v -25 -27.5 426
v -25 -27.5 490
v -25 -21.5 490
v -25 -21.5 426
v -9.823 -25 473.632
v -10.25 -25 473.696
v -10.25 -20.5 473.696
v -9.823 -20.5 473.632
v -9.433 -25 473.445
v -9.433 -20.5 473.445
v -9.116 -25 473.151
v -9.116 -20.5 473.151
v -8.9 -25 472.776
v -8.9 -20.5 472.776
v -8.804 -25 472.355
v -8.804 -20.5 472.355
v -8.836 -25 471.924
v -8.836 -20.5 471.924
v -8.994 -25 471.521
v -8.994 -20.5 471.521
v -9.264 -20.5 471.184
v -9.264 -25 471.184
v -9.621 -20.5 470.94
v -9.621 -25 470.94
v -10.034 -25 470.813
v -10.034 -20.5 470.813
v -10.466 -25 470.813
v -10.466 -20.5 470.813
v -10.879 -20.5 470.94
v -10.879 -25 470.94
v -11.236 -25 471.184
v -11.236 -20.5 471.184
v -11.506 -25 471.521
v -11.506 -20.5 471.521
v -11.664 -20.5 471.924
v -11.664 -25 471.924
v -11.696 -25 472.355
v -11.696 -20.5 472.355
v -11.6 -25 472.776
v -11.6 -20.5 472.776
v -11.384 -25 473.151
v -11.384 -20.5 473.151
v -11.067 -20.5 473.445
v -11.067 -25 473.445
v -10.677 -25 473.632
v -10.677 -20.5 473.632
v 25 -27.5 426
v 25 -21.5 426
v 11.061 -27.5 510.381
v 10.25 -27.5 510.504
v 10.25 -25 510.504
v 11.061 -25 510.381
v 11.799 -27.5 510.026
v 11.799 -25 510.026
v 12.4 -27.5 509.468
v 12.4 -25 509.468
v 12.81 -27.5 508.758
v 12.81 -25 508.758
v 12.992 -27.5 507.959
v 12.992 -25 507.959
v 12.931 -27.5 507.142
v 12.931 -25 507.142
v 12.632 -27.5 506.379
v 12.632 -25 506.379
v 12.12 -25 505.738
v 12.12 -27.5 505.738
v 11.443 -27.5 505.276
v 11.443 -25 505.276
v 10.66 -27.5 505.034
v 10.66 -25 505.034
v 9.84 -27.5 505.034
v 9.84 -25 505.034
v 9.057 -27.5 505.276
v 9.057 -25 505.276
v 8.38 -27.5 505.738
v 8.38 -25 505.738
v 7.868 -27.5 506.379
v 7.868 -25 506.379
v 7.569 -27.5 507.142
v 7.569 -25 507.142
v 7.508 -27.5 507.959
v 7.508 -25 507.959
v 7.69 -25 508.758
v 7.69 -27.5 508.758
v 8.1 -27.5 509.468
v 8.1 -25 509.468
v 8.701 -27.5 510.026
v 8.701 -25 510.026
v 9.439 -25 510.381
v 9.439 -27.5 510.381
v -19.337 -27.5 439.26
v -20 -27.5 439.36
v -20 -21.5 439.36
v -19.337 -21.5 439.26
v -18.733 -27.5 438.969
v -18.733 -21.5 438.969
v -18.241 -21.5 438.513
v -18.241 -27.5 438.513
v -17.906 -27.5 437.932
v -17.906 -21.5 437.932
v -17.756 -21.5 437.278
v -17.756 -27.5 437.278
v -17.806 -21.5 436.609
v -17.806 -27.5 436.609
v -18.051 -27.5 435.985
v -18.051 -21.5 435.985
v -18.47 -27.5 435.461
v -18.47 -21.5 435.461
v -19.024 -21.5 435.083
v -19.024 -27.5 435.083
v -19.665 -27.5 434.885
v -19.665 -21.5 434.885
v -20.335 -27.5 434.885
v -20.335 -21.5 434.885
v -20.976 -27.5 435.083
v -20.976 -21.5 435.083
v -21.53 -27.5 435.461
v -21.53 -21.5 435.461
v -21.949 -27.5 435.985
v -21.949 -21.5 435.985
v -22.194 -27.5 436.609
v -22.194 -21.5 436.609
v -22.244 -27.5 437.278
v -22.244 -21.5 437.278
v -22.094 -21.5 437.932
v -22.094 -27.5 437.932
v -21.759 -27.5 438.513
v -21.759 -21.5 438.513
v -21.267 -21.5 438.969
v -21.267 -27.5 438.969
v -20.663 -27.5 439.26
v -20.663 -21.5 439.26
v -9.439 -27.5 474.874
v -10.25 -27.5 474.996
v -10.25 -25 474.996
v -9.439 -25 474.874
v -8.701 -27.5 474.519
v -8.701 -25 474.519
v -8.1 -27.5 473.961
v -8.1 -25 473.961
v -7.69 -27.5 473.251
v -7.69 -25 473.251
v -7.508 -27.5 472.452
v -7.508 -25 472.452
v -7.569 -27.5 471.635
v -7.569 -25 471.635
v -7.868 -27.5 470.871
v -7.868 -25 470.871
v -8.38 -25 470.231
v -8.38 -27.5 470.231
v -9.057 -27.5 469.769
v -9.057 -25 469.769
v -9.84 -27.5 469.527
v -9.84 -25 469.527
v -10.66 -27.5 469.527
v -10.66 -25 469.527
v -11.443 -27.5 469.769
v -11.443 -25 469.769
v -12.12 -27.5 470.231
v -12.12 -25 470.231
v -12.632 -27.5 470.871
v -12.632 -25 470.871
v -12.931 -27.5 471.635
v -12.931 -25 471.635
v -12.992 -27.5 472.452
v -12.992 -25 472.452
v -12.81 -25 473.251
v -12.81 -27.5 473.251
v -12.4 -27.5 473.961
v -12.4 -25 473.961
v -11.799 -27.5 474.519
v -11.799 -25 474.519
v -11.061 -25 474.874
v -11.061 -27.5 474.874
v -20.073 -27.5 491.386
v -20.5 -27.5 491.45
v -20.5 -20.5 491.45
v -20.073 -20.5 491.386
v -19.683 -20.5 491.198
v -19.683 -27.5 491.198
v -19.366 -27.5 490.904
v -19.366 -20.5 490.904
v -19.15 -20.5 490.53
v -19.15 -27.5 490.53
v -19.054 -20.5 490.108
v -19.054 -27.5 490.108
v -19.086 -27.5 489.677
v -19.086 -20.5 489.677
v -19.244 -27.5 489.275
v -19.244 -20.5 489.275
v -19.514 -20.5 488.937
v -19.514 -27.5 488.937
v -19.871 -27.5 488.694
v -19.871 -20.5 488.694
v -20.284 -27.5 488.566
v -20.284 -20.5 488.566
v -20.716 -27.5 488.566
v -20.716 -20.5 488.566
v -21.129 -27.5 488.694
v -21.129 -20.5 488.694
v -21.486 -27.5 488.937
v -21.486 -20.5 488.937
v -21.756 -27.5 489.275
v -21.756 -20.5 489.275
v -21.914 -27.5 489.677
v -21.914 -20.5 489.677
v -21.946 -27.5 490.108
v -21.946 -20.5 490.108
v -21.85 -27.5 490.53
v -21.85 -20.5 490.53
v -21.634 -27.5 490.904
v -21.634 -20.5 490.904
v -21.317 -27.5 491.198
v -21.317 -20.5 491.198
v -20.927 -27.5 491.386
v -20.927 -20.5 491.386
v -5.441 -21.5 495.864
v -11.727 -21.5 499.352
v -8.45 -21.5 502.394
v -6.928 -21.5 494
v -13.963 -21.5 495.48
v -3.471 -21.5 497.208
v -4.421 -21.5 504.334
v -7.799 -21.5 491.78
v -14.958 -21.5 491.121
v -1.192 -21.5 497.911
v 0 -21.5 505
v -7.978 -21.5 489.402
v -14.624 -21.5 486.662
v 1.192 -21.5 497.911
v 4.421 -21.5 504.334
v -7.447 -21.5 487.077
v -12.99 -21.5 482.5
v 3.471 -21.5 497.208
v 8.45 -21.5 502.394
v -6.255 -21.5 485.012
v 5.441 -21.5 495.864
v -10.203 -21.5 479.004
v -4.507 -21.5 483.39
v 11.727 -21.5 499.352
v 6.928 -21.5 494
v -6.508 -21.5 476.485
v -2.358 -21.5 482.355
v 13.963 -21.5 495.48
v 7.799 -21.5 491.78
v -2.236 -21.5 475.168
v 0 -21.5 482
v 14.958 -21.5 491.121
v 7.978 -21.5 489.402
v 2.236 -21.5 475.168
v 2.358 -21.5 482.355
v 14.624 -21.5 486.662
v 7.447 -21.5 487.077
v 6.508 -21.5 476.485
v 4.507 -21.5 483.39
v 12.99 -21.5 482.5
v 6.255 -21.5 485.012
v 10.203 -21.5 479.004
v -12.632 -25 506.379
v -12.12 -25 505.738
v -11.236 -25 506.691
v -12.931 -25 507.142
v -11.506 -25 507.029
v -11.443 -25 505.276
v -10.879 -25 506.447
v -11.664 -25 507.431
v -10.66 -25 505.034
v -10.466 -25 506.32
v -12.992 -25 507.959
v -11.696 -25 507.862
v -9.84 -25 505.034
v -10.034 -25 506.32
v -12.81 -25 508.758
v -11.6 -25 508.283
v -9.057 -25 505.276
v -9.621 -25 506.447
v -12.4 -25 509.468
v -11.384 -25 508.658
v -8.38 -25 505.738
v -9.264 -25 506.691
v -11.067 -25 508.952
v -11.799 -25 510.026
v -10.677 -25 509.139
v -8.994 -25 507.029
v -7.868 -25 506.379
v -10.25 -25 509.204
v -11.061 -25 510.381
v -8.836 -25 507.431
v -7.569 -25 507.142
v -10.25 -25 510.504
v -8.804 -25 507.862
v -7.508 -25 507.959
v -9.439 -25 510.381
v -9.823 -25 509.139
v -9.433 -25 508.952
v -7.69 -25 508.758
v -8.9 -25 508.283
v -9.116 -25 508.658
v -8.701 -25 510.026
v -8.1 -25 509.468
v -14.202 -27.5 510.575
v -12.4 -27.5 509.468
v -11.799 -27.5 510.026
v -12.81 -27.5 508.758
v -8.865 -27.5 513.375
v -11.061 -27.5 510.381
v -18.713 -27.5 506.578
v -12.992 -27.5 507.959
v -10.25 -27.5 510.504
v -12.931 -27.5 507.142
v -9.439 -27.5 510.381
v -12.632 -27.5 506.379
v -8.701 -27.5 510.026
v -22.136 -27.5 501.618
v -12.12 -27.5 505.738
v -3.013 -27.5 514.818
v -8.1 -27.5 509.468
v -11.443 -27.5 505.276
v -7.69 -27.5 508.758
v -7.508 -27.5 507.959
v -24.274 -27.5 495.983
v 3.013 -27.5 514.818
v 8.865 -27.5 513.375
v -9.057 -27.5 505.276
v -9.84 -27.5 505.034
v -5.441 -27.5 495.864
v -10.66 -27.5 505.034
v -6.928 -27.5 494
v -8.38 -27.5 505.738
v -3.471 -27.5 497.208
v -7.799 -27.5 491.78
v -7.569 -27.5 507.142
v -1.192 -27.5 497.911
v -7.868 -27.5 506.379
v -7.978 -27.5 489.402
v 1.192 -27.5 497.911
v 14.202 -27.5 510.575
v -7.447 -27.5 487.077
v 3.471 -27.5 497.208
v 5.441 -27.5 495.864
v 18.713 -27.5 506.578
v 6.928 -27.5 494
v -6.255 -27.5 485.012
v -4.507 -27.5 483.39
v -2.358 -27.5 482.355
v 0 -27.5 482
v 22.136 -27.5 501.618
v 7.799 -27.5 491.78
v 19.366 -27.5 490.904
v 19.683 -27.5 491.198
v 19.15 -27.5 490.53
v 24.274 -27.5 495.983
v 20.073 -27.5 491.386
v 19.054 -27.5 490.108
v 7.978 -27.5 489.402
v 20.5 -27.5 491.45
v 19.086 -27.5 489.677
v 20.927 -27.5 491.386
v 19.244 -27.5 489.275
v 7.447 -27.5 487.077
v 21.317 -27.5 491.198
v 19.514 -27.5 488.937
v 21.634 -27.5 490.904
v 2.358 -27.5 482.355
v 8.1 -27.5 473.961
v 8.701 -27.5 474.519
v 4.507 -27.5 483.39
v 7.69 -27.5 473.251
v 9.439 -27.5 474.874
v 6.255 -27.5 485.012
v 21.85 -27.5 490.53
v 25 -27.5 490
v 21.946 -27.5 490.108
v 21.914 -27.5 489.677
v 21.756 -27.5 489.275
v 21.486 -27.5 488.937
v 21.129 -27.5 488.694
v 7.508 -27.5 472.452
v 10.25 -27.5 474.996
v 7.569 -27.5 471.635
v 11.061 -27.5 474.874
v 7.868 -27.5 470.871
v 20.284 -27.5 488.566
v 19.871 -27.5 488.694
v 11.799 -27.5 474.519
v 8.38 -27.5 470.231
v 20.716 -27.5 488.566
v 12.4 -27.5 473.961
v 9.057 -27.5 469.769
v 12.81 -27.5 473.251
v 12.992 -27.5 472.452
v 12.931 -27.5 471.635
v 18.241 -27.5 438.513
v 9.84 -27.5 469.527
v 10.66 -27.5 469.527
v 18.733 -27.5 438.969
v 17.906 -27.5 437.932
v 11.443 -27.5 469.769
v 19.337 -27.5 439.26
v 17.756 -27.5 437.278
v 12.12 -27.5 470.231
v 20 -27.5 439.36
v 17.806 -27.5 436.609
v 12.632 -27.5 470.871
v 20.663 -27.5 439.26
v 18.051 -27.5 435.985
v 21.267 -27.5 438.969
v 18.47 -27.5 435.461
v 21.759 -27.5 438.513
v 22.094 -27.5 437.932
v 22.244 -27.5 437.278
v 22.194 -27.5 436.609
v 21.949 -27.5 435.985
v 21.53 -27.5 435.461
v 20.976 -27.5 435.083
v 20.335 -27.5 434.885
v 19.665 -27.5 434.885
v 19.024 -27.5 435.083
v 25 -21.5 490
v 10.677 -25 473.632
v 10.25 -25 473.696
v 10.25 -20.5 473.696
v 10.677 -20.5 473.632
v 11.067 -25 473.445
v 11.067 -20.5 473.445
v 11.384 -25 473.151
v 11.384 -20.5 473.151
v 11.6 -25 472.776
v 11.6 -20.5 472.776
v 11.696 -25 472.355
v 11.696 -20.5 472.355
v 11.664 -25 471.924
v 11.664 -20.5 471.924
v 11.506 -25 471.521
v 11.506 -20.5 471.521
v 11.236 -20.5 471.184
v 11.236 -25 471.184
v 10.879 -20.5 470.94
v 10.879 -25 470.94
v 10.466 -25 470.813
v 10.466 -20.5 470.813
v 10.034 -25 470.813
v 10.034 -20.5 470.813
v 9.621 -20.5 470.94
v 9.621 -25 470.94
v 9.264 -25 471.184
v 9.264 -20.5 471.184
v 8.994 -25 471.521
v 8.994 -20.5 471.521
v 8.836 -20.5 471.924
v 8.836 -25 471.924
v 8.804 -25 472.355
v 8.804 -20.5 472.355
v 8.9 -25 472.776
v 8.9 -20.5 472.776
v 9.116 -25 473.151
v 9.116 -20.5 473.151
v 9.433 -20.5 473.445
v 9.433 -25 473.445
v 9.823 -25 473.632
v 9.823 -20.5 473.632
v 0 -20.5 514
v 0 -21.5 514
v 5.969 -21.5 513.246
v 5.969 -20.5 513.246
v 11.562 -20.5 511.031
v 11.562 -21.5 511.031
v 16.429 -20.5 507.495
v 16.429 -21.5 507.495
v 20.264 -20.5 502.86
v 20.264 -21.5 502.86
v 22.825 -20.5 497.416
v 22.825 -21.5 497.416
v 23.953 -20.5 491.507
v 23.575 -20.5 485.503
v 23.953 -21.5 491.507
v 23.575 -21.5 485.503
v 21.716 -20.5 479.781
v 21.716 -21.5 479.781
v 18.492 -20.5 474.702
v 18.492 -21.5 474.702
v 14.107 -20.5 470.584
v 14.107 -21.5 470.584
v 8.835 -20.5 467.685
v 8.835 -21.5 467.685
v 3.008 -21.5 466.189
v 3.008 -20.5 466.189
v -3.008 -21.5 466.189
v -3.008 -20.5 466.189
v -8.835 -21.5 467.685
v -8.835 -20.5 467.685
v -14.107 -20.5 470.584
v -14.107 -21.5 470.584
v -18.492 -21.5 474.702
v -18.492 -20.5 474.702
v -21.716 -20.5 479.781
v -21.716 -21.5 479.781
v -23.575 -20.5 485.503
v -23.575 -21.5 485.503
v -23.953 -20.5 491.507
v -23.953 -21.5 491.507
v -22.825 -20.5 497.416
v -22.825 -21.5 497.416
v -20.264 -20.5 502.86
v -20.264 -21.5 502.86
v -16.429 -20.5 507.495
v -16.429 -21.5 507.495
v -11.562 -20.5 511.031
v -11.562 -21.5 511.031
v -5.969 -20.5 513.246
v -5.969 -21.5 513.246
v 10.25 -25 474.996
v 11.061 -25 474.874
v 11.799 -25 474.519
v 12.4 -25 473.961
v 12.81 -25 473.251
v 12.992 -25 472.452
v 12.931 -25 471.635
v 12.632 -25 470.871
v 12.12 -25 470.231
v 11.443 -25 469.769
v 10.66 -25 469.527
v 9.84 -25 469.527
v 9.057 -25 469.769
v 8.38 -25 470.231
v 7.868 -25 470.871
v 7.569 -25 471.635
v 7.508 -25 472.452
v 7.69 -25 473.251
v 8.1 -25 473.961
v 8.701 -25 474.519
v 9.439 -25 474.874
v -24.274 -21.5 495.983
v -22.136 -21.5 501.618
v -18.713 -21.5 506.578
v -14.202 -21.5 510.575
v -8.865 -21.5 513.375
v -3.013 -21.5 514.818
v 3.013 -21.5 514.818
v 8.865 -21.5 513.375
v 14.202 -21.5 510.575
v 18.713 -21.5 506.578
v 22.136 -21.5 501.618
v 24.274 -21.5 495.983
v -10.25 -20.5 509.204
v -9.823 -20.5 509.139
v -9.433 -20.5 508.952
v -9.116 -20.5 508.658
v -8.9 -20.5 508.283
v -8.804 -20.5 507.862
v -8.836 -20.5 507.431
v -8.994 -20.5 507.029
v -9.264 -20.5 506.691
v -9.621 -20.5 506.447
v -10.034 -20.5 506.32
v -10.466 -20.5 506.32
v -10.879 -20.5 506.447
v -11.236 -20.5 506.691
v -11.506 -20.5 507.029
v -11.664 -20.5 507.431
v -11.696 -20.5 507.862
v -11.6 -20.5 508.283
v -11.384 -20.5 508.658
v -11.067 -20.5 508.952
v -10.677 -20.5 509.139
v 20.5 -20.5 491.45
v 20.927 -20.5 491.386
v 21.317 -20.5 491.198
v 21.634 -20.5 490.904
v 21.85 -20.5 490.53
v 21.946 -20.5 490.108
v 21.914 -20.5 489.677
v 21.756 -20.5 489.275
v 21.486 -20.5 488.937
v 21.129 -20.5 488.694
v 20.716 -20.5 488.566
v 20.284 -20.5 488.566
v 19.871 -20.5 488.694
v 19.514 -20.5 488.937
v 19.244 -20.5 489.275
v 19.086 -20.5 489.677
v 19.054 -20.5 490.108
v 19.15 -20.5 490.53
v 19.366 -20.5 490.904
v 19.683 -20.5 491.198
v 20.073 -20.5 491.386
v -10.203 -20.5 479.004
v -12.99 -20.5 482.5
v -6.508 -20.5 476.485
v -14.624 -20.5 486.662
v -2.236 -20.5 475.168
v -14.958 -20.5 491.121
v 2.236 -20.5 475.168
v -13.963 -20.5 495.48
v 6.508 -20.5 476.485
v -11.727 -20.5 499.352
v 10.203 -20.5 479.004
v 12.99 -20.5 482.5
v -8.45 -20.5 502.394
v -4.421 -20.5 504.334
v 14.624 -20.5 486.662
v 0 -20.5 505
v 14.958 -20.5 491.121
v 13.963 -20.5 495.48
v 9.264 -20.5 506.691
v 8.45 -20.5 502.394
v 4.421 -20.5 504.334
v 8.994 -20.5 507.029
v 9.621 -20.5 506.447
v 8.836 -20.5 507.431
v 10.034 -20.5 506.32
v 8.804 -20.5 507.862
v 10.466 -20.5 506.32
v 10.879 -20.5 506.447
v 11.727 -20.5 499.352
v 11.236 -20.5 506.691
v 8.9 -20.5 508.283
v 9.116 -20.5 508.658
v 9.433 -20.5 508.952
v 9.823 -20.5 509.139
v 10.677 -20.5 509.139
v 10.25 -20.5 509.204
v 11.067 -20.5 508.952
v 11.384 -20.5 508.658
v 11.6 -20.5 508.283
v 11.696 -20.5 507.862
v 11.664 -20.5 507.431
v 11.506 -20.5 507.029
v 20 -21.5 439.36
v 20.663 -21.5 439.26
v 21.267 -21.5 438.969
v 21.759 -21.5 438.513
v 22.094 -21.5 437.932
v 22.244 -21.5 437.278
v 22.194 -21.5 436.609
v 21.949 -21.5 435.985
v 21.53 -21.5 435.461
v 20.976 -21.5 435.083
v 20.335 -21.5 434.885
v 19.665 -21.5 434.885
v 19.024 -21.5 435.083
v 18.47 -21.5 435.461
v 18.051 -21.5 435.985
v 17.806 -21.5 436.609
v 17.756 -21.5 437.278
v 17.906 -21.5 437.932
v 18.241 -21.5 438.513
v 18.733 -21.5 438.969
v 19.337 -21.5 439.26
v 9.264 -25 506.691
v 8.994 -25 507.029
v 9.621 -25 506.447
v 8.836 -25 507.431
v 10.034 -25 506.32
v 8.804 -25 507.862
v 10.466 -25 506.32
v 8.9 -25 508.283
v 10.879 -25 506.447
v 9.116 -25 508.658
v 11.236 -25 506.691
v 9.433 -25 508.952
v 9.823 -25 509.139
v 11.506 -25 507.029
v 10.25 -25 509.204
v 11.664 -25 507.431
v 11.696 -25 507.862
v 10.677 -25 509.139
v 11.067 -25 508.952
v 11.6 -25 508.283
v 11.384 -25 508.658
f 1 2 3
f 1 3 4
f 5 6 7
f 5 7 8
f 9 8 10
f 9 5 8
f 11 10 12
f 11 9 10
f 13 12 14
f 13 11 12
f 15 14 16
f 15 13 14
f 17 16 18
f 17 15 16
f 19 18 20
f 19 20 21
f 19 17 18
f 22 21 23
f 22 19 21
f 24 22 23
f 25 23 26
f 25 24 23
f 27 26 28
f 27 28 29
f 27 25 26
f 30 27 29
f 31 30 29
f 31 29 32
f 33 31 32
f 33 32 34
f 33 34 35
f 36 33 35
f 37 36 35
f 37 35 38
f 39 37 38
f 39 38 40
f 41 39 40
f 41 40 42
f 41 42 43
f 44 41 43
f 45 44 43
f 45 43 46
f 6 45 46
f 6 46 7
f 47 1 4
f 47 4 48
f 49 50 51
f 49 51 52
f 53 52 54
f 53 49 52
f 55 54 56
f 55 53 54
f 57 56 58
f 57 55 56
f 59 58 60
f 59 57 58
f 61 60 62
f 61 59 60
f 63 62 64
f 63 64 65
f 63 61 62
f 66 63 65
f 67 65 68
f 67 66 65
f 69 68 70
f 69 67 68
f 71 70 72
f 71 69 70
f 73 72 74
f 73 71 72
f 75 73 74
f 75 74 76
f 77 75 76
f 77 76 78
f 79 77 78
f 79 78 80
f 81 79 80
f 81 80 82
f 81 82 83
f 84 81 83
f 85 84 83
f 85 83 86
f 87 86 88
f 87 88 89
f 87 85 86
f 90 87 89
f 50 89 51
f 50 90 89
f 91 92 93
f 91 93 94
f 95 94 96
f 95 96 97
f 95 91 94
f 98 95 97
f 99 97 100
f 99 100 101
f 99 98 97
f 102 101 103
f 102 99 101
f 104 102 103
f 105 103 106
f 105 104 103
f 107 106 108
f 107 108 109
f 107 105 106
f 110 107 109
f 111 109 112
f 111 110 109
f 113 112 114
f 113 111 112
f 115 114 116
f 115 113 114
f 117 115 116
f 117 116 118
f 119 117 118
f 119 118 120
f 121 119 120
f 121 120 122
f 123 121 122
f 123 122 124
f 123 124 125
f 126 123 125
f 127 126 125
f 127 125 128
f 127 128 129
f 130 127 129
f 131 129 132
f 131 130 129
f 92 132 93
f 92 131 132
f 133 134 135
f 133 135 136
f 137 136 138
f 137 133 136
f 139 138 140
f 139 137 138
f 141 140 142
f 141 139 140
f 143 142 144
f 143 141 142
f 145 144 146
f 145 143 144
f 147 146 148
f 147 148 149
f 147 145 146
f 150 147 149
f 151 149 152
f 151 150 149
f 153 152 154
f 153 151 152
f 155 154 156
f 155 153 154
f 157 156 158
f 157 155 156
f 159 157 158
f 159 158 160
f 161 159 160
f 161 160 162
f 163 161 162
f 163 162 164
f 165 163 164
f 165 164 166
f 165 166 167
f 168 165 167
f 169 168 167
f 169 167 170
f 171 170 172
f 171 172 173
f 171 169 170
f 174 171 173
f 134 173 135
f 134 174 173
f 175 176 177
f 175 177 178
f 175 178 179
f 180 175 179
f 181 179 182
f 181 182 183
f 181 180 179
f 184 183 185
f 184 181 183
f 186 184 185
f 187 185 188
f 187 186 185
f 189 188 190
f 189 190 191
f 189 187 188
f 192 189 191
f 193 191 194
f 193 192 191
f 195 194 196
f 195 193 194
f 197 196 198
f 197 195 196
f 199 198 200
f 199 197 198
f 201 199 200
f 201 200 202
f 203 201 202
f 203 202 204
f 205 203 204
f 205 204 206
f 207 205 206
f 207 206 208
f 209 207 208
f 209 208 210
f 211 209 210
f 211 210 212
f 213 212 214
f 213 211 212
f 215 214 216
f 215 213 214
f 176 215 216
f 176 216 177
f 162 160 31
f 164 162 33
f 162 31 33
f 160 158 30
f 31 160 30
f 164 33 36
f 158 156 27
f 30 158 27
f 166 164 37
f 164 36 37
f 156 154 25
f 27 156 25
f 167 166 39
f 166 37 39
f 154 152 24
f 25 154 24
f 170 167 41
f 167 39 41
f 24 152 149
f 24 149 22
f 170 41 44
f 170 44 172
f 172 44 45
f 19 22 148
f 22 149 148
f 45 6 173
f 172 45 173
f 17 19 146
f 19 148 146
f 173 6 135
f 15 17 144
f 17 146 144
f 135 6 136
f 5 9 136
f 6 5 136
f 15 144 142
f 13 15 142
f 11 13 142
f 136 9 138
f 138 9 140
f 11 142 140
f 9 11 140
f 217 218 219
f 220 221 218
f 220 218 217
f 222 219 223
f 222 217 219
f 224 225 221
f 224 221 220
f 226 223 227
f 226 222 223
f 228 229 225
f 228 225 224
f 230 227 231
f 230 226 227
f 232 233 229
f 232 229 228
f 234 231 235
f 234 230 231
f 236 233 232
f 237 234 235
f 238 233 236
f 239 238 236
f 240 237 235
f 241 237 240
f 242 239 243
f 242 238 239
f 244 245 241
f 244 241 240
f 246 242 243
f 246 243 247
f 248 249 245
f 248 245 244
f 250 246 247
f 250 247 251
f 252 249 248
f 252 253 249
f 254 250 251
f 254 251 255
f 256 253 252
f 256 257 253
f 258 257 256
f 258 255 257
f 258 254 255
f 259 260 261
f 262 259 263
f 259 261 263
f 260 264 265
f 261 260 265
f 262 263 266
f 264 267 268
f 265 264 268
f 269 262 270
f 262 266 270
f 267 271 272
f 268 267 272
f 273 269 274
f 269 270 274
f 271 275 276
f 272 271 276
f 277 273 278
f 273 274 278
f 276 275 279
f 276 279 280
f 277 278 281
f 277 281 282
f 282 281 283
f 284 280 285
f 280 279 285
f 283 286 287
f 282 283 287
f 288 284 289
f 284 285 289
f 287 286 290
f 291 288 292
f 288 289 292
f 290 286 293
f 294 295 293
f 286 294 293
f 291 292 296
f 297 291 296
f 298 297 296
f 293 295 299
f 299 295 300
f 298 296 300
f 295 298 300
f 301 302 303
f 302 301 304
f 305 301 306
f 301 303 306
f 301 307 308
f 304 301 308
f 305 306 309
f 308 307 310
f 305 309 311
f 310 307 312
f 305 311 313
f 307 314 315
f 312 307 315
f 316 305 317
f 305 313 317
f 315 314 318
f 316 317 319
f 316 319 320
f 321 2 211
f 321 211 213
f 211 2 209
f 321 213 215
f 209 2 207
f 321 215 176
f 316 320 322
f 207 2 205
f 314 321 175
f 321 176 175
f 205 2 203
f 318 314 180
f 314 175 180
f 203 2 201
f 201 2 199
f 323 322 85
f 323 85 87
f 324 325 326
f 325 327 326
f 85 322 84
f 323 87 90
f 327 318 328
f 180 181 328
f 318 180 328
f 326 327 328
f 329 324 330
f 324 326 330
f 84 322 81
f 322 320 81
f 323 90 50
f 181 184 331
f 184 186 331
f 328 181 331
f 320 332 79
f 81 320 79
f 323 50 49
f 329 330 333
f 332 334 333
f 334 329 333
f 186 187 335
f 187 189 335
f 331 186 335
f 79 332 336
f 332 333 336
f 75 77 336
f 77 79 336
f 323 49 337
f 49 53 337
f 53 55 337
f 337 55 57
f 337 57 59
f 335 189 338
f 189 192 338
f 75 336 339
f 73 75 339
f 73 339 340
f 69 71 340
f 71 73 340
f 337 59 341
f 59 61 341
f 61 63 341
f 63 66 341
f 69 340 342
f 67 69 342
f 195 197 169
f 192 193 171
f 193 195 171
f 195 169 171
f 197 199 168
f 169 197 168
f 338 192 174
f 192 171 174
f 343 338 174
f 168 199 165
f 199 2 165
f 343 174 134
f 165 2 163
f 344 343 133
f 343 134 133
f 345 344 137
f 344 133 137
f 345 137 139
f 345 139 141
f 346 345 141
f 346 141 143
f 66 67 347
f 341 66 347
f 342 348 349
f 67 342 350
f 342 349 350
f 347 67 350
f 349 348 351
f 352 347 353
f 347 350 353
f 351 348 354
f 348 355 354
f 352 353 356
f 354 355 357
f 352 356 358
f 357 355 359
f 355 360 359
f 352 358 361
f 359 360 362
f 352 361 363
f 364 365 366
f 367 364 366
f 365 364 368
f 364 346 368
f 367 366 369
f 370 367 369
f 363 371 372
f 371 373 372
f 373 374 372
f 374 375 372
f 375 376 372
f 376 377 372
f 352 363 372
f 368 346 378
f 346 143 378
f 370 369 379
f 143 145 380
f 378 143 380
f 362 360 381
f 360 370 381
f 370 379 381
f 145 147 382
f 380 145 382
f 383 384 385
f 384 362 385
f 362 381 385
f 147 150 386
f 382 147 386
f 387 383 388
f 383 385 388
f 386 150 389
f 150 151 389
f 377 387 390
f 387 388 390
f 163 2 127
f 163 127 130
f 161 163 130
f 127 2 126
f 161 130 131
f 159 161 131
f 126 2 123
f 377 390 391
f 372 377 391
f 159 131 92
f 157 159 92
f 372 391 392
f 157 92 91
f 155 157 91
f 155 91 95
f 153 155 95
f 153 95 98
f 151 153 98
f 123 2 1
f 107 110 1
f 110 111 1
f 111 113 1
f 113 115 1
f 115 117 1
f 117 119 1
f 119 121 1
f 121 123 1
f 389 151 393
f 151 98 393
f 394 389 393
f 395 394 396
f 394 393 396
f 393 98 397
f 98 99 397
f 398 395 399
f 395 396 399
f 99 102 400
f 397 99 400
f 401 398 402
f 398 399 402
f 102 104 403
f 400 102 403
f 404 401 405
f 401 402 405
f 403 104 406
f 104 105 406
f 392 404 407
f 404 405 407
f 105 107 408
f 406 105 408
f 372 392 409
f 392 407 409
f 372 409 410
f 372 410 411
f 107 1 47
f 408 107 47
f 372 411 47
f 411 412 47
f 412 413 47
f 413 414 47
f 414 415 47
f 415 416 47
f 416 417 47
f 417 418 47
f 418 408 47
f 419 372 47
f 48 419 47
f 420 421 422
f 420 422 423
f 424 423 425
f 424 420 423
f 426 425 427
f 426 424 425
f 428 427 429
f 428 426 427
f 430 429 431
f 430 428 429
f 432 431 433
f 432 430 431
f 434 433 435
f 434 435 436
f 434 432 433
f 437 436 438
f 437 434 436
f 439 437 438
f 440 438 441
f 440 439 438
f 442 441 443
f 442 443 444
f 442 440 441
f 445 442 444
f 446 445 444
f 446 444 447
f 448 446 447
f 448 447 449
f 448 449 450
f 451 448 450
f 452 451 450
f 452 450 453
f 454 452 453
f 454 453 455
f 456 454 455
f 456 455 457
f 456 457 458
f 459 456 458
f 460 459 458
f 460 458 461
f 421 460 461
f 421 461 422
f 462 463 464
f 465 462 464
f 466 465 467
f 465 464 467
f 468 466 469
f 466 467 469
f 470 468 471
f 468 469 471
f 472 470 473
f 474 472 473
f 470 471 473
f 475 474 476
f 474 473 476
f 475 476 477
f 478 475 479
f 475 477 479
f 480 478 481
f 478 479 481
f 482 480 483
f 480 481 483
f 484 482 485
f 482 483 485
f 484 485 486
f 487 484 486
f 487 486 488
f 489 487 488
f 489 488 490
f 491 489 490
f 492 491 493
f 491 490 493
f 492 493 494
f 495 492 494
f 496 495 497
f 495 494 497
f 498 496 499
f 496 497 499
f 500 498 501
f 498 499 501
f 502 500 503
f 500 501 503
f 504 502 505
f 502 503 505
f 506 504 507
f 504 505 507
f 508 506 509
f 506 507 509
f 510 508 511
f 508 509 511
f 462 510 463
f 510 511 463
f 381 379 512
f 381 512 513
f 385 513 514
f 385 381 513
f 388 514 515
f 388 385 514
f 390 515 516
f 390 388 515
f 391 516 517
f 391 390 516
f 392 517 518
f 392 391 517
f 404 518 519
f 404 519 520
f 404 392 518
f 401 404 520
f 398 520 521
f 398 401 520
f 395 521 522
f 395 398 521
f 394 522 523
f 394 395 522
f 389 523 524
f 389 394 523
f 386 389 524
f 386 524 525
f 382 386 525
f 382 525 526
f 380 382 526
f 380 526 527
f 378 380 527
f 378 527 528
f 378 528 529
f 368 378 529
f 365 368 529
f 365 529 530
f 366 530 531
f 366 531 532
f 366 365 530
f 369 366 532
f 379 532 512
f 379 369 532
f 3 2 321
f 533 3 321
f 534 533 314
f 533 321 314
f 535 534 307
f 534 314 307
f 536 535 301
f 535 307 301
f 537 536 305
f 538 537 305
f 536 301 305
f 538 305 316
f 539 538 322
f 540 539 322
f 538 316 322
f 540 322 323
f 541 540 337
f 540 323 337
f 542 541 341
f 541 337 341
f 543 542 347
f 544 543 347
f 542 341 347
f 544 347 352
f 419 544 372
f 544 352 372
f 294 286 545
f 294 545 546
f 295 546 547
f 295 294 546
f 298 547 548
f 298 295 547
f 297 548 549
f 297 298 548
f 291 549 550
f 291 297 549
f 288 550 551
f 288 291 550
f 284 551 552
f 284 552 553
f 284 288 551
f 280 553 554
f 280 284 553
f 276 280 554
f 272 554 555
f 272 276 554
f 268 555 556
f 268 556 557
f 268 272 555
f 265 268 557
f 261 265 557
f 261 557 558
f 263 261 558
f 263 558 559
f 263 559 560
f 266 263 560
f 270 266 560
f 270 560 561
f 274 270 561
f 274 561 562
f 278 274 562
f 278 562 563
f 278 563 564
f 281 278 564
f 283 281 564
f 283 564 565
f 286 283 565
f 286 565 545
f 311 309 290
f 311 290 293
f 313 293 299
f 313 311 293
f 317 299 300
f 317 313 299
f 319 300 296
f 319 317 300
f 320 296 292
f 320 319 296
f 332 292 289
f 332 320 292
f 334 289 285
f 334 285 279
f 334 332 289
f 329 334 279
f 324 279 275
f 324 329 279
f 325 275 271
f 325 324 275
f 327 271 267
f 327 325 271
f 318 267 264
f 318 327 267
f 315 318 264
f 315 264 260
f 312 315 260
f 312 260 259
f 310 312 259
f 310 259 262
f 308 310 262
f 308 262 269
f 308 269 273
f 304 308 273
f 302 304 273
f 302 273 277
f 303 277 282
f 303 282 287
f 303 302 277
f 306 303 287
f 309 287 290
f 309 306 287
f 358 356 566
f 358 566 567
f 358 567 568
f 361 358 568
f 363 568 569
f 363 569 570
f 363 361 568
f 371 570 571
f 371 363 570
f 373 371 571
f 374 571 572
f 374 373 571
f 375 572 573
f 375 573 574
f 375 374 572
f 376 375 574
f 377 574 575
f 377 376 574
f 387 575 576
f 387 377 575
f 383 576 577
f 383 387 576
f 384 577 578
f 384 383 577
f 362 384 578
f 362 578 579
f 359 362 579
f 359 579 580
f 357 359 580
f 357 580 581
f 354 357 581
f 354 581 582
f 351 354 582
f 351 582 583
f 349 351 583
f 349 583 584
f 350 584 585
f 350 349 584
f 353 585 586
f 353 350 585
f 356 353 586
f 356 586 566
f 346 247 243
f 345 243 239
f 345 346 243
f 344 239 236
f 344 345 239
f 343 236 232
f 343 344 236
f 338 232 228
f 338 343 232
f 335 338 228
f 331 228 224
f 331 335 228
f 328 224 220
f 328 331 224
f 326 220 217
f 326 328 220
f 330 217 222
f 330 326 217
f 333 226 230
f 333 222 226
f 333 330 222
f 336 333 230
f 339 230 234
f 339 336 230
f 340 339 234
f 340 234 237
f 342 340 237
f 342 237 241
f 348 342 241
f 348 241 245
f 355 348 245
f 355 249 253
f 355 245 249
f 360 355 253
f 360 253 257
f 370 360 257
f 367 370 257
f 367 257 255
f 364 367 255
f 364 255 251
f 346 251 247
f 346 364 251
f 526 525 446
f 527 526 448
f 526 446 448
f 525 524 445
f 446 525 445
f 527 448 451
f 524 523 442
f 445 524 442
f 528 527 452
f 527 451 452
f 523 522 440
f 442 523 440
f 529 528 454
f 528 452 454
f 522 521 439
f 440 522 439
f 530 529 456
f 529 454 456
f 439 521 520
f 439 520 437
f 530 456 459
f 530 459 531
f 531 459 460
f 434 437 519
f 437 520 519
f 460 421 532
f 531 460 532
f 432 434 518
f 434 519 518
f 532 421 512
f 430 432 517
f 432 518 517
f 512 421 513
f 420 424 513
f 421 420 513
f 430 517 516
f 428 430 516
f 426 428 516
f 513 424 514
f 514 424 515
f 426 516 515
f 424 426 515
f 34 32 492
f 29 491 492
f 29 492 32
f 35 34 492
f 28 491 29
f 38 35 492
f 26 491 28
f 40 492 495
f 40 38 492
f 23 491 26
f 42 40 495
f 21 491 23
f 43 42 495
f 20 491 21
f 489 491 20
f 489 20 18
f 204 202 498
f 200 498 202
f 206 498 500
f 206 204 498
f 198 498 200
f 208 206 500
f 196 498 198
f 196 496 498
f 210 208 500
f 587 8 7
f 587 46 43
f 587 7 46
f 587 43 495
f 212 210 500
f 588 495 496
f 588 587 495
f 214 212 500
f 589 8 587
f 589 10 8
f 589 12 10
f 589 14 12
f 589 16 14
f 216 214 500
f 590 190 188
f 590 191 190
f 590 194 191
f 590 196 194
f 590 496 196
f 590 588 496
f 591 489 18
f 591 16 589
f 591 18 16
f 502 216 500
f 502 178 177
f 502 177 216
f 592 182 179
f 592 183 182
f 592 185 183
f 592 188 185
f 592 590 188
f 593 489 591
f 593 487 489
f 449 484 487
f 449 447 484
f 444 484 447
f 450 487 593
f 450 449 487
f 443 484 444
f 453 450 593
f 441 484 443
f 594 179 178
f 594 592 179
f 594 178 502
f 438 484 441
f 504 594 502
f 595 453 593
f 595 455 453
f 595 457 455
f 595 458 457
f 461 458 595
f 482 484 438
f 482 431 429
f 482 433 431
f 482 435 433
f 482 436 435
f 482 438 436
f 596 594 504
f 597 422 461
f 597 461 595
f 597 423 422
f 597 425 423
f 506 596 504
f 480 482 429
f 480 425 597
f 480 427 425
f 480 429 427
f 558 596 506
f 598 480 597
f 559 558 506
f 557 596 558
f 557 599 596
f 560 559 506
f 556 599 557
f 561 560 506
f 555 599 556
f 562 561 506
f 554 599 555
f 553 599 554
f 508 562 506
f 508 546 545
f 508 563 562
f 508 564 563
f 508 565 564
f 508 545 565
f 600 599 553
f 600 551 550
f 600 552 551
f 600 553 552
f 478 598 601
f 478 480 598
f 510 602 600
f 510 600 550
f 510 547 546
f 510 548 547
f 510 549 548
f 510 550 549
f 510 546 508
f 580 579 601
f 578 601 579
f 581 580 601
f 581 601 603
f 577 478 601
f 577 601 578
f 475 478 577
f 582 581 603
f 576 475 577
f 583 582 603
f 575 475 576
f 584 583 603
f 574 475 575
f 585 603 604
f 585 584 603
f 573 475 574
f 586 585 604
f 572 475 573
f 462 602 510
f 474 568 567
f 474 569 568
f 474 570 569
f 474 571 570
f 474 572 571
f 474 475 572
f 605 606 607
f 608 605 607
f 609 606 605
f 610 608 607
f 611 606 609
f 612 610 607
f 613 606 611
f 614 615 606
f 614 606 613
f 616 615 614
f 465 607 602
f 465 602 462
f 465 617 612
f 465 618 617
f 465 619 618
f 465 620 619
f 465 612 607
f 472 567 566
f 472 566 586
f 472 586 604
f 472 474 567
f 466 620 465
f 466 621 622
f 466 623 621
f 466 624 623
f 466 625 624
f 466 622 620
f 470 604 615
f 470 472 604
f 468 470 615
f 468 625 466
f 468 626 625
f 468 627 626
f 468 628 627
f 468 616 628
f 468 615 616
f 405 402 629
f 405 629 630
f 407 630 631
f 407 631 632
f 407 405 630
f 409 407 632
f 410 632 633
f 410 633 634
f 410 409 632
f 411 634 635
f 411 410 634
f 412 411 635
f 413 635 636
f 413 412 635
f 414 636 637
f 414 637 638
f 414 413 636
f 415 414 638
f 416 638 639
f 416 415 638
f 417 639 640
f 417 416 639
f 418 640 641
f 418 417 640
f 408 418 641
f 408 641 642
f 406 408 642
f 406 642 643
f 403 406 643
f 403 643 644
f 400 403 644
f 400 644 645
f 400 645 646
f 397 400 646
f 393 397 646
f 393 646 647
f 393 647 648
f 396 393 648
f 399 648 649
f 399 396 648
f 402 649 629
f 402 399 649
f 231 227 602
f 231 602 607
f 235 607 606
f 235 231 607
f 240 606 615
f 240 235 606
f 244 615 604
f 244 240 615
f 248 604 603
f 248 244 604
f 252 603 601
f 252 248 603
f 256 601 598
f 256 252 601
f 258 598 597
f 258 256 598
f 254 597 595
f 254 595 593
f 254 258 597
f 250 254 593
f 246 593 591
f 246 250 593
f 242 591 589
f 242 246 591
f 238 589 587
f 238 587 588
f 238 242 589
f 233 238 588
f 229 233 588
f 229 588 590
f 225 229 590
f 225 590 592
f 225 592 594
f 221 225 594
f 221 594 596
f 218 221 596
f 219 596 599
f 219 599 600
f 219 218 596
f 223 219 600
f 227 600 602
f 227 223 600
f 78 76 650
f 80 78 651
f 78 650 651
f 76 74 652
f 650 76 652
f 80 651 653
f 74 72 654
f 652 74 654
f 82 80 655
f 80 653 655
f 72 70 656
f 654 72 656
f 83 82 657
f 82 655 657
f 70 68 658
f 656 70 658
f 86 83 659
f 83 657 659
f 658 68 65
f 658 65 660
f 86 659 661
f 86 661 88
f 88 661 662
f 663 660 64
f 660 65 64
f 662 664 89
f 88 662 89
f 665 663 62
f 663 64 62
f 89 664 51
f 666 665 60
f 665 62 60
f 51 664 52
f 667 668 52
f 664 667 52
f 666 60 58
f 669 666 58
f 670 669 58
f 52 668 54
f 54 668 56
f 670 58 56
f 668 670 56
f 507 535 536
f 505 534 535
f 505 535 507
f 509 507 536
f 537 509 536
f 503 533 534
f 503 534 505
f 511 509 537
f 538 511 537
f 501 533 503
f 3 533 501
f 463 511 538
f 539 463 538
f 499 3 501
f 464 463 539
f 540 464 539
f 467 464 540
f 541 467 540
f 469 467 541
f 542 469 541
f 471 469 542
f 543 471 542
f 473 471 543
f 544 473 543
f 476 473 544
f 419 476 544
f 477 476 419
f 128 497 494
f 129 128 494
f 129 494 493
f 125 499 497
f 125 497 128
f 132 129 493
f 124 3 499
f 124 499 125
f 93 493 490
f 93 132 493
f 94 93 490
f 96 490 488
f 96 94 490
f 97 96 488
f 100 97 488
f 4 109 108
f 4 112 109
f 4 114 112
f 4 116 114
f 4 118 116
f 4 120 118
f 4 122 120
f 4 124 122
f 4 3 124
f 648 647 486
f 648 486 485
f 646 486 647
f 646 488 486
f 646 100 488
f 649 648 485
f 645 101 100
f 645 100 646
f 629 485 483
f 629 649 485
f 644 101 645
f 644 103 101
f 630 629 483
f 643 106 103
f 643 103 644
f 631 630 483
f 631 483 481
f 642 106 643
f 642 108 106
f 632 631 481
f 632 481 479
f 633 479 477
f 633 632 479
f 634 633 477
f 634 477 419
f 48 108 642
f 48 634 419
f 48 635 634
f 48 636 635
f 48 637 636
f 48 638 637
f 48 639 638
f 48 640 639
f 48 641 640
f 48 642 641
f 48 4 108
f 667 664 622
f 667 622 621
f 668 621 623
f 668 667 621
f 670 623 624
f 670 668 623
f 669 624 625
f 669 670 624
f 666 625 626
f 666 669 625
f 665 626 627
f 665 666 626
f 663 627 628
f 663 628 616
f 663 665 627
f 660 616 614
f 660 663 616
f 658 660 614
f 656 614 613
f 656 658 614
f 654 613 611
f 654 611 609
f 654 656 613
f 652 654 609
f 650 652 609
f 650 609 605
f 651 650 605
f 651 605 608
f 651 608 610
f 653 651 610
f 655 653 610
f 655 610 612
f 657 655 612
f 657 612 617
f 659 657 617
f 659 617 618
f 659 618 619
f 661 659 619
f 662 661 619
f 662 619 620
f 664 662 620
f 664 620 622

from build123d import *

# Parameters (mm, degrees)
PARED_START                    = -27.5
SK_PARED_W                     = 50
SK_PARED_H                     = 64
PARED_DEPTH                    = 6
CABEZA_START                   = -27.5
SK_CABEZA_R                    = 25
CABEZA_DEPTH                   = 6
ASIENTO_1MM_START              = -21.5
SK_ASIENTO_1MM_R               = 24
SK_ASIENTO_1MM_R_2             = 15
ASIENTO_1MM_DEPTH              = 1
PASO_CENTRAL_START             = -27.5
SK_PASO_CENTRAL_R              = 8
PASO_CENTRAL_DEPTH             = 7
PASANTES_M2_5_ESTATOR_J5_START = -27.5
SK_PASANTES_M2_5_ESTATOR_J5_R  = 1.45
PASANTES_M2_5_ESTATOR_J5_DEPTH = 7
CAJAS_M2_5_J5_START            = -27.5
SK_CAJAS_M2_5_J5_R             = 2.75
CAJAS_M2_5_J5_DEPTH            = 2.5
PASANTES_M4_ANGULOS_START      = -27.5
SK_PASANTES_M4_ANGULOS_R       = 2.25
PASANTES_M4_ANGULOS_DEPTH      = 6


with BuildPart() as part:
    # Sk_Pared → Pared (new body)
    with BuildSketch(Plane(origin=(0, 0, 0), x_dir=(1, 0, 0), z_dir=(0, 1, 0)).offset(PARED_START)):
        with Locations((0, -458)):
            Rectangle(SK_PARED_W, SK_PARED_H)
    extrude(amount=PARED_DEPTH)

    # Sk_Cabeza → Cabeza (add)
    with BuildSketch(Plane(origin=(0, 0, 0), x_dir=(1, 0, 0), z_dir=(0, 1, 0)).offset(CABEZA_START)):
        with Locations((0, -490)):
            Circle(SK_CABEZA_R)
    extrude(amount=CABEZA_DEPTH)

    # Sk_Asiento_1mm → Asiento_1mm (add)
    with BuildSketch(Plane(origin=(0, 0, 0), x_dir=(1, 0, 0), z_dir=(0, 1, 0)).offset(ASIENTO_1MM_START)):
        with Locations(Location((0, -490, 0), (0, 0, 270))):
            Circle(SK_ASIENTO_1MM_R)
        with Locations(Location((0, -490, 0), (0, 0, 270))):
            Circle(SK_ASIENTO_1MM_R_2, mode=Mode.SUBTRACT)
    extrude(amount=ASIENTO_1MM_DEPTH)

    # Sk_Paso_central → Paso_central (cut)
    with BuildSketch(Plane(origin=(0, 0, 0), x_dir=(1, 0, 0), z_dir=(0, 1, 0)).offset(PASO_CENTRAL_START)):
        with Locations(Location((0, -490, 0), (0, 0, 90))):
            Circle(SK_PASO_CENTRAL_R)
    extrude(amount=PASO_CENTRAL_DEPTH, mode=Mode.SUBTRACT)

    # Sk_Pasantes_M2-5_estator_J5 → Pasantes_M2-5_estator_J5 (cut)
    with BuildSketch(Plane(origin=(0, 0, 0), x_dir=(1, 0, 0), z_dir=(0, 1, 0)).offset(PASANTES_M2_5_ESTATOR_J5_START)):
        with Locations(Location((20.5, -490, 0), (0, 0, 270))):
            Circle(SK_PASANTES_M2_5_ESTATOR_J5_R)
        with Locations(Location((10.25, -507.753520778, 0), (0, 0, 270))):
            Circle(SK_PASANTES_M2_5_ESTATOR_J5_R)
        with Locations(Location((-10.25, -507.753520778, 0), (0, 0, 270))):
            Circle(SK_PASANTES_M2_5_ESTATOR_J5_R)
        with Locations(Location((-20.5, -490, 0), (0, 0, 270))):
            Circle(SK_PASANTES_M2_5_ESTATOR_J5_R)
        with Locations(Location((-10.25, -472.246479222, 0), (0, 0, 270))):
            Circle(SK_PASANTES_M2_5_ESTATOR_J5_R)
        with Locations(Location((10.25, -472.246479222, 0), (0, 0, 270))):
            Circle(SK_PASANTES_M2_5_ESTATOR_J5_R)
    extrude(amount=PASANTES_M2_5_ESTATOR_J5_DEPTH, mode=Mode.SUBTRACT)

    # Sk_Cajas_M2-5_J5 → Cajas_M2-5_J5 (cut)
    with BuildSketch(Plane(origin=(0, 0, 0), x_dir=(1, 0, 0), z_dir=(0, 1, 0)).offset(CAJAS_M2_5_J5_START)):
        with Locations(Location((10.25, -507.753520778, 0), (0, 0, 270))):
            Circle(SK_CAJAS_M2_5_J5_R)
        with Locations(Location((-10.25, -507.753520778, 0), (0, 0, 270))):
            Circle(SK_CAJAS_M2_5_J5_R)
        with Locations(Location((-10.25, -472.246479222, 0), (0, 0, 270))):
            Circle(SK_CAJAS_M2_5_J5_R)
        with Locations(Location((10.25, -472.246479222, 0), (0, 0, 270))):
            Circle(SK_CAJAS_M2_5_J5_R)
    extrude(amount=CAJAS_M2_5_J5_DEPTH, mode=Mode.SUBTRACT)

    # Sk_Pasantes_M4_angulos → Pasantes_M4_angulos (cut)
    with BuildSketch(Plane(origin=(0, 0, 0), x_dir=(1, 0, 0), z_dir=(0, 1, 0)).offset(PASANTES_M4_ANGULOS_START)):
        with Locations(Location((-20, -437.11, 0), (0, 0, 270))):
            Circle(SK_PASANTES_M4_ANGULOS_R)
        with Locations(Location((20, -437.11, 0), (0, 0, 270))):
            Circle(SK_PASANTES_M4_ANGULOS_R)
    extrude(amount=PASANTES_M4_ANGULOS_DEPTH, mode=Mode.SUBTRACT)


solid = part.part
